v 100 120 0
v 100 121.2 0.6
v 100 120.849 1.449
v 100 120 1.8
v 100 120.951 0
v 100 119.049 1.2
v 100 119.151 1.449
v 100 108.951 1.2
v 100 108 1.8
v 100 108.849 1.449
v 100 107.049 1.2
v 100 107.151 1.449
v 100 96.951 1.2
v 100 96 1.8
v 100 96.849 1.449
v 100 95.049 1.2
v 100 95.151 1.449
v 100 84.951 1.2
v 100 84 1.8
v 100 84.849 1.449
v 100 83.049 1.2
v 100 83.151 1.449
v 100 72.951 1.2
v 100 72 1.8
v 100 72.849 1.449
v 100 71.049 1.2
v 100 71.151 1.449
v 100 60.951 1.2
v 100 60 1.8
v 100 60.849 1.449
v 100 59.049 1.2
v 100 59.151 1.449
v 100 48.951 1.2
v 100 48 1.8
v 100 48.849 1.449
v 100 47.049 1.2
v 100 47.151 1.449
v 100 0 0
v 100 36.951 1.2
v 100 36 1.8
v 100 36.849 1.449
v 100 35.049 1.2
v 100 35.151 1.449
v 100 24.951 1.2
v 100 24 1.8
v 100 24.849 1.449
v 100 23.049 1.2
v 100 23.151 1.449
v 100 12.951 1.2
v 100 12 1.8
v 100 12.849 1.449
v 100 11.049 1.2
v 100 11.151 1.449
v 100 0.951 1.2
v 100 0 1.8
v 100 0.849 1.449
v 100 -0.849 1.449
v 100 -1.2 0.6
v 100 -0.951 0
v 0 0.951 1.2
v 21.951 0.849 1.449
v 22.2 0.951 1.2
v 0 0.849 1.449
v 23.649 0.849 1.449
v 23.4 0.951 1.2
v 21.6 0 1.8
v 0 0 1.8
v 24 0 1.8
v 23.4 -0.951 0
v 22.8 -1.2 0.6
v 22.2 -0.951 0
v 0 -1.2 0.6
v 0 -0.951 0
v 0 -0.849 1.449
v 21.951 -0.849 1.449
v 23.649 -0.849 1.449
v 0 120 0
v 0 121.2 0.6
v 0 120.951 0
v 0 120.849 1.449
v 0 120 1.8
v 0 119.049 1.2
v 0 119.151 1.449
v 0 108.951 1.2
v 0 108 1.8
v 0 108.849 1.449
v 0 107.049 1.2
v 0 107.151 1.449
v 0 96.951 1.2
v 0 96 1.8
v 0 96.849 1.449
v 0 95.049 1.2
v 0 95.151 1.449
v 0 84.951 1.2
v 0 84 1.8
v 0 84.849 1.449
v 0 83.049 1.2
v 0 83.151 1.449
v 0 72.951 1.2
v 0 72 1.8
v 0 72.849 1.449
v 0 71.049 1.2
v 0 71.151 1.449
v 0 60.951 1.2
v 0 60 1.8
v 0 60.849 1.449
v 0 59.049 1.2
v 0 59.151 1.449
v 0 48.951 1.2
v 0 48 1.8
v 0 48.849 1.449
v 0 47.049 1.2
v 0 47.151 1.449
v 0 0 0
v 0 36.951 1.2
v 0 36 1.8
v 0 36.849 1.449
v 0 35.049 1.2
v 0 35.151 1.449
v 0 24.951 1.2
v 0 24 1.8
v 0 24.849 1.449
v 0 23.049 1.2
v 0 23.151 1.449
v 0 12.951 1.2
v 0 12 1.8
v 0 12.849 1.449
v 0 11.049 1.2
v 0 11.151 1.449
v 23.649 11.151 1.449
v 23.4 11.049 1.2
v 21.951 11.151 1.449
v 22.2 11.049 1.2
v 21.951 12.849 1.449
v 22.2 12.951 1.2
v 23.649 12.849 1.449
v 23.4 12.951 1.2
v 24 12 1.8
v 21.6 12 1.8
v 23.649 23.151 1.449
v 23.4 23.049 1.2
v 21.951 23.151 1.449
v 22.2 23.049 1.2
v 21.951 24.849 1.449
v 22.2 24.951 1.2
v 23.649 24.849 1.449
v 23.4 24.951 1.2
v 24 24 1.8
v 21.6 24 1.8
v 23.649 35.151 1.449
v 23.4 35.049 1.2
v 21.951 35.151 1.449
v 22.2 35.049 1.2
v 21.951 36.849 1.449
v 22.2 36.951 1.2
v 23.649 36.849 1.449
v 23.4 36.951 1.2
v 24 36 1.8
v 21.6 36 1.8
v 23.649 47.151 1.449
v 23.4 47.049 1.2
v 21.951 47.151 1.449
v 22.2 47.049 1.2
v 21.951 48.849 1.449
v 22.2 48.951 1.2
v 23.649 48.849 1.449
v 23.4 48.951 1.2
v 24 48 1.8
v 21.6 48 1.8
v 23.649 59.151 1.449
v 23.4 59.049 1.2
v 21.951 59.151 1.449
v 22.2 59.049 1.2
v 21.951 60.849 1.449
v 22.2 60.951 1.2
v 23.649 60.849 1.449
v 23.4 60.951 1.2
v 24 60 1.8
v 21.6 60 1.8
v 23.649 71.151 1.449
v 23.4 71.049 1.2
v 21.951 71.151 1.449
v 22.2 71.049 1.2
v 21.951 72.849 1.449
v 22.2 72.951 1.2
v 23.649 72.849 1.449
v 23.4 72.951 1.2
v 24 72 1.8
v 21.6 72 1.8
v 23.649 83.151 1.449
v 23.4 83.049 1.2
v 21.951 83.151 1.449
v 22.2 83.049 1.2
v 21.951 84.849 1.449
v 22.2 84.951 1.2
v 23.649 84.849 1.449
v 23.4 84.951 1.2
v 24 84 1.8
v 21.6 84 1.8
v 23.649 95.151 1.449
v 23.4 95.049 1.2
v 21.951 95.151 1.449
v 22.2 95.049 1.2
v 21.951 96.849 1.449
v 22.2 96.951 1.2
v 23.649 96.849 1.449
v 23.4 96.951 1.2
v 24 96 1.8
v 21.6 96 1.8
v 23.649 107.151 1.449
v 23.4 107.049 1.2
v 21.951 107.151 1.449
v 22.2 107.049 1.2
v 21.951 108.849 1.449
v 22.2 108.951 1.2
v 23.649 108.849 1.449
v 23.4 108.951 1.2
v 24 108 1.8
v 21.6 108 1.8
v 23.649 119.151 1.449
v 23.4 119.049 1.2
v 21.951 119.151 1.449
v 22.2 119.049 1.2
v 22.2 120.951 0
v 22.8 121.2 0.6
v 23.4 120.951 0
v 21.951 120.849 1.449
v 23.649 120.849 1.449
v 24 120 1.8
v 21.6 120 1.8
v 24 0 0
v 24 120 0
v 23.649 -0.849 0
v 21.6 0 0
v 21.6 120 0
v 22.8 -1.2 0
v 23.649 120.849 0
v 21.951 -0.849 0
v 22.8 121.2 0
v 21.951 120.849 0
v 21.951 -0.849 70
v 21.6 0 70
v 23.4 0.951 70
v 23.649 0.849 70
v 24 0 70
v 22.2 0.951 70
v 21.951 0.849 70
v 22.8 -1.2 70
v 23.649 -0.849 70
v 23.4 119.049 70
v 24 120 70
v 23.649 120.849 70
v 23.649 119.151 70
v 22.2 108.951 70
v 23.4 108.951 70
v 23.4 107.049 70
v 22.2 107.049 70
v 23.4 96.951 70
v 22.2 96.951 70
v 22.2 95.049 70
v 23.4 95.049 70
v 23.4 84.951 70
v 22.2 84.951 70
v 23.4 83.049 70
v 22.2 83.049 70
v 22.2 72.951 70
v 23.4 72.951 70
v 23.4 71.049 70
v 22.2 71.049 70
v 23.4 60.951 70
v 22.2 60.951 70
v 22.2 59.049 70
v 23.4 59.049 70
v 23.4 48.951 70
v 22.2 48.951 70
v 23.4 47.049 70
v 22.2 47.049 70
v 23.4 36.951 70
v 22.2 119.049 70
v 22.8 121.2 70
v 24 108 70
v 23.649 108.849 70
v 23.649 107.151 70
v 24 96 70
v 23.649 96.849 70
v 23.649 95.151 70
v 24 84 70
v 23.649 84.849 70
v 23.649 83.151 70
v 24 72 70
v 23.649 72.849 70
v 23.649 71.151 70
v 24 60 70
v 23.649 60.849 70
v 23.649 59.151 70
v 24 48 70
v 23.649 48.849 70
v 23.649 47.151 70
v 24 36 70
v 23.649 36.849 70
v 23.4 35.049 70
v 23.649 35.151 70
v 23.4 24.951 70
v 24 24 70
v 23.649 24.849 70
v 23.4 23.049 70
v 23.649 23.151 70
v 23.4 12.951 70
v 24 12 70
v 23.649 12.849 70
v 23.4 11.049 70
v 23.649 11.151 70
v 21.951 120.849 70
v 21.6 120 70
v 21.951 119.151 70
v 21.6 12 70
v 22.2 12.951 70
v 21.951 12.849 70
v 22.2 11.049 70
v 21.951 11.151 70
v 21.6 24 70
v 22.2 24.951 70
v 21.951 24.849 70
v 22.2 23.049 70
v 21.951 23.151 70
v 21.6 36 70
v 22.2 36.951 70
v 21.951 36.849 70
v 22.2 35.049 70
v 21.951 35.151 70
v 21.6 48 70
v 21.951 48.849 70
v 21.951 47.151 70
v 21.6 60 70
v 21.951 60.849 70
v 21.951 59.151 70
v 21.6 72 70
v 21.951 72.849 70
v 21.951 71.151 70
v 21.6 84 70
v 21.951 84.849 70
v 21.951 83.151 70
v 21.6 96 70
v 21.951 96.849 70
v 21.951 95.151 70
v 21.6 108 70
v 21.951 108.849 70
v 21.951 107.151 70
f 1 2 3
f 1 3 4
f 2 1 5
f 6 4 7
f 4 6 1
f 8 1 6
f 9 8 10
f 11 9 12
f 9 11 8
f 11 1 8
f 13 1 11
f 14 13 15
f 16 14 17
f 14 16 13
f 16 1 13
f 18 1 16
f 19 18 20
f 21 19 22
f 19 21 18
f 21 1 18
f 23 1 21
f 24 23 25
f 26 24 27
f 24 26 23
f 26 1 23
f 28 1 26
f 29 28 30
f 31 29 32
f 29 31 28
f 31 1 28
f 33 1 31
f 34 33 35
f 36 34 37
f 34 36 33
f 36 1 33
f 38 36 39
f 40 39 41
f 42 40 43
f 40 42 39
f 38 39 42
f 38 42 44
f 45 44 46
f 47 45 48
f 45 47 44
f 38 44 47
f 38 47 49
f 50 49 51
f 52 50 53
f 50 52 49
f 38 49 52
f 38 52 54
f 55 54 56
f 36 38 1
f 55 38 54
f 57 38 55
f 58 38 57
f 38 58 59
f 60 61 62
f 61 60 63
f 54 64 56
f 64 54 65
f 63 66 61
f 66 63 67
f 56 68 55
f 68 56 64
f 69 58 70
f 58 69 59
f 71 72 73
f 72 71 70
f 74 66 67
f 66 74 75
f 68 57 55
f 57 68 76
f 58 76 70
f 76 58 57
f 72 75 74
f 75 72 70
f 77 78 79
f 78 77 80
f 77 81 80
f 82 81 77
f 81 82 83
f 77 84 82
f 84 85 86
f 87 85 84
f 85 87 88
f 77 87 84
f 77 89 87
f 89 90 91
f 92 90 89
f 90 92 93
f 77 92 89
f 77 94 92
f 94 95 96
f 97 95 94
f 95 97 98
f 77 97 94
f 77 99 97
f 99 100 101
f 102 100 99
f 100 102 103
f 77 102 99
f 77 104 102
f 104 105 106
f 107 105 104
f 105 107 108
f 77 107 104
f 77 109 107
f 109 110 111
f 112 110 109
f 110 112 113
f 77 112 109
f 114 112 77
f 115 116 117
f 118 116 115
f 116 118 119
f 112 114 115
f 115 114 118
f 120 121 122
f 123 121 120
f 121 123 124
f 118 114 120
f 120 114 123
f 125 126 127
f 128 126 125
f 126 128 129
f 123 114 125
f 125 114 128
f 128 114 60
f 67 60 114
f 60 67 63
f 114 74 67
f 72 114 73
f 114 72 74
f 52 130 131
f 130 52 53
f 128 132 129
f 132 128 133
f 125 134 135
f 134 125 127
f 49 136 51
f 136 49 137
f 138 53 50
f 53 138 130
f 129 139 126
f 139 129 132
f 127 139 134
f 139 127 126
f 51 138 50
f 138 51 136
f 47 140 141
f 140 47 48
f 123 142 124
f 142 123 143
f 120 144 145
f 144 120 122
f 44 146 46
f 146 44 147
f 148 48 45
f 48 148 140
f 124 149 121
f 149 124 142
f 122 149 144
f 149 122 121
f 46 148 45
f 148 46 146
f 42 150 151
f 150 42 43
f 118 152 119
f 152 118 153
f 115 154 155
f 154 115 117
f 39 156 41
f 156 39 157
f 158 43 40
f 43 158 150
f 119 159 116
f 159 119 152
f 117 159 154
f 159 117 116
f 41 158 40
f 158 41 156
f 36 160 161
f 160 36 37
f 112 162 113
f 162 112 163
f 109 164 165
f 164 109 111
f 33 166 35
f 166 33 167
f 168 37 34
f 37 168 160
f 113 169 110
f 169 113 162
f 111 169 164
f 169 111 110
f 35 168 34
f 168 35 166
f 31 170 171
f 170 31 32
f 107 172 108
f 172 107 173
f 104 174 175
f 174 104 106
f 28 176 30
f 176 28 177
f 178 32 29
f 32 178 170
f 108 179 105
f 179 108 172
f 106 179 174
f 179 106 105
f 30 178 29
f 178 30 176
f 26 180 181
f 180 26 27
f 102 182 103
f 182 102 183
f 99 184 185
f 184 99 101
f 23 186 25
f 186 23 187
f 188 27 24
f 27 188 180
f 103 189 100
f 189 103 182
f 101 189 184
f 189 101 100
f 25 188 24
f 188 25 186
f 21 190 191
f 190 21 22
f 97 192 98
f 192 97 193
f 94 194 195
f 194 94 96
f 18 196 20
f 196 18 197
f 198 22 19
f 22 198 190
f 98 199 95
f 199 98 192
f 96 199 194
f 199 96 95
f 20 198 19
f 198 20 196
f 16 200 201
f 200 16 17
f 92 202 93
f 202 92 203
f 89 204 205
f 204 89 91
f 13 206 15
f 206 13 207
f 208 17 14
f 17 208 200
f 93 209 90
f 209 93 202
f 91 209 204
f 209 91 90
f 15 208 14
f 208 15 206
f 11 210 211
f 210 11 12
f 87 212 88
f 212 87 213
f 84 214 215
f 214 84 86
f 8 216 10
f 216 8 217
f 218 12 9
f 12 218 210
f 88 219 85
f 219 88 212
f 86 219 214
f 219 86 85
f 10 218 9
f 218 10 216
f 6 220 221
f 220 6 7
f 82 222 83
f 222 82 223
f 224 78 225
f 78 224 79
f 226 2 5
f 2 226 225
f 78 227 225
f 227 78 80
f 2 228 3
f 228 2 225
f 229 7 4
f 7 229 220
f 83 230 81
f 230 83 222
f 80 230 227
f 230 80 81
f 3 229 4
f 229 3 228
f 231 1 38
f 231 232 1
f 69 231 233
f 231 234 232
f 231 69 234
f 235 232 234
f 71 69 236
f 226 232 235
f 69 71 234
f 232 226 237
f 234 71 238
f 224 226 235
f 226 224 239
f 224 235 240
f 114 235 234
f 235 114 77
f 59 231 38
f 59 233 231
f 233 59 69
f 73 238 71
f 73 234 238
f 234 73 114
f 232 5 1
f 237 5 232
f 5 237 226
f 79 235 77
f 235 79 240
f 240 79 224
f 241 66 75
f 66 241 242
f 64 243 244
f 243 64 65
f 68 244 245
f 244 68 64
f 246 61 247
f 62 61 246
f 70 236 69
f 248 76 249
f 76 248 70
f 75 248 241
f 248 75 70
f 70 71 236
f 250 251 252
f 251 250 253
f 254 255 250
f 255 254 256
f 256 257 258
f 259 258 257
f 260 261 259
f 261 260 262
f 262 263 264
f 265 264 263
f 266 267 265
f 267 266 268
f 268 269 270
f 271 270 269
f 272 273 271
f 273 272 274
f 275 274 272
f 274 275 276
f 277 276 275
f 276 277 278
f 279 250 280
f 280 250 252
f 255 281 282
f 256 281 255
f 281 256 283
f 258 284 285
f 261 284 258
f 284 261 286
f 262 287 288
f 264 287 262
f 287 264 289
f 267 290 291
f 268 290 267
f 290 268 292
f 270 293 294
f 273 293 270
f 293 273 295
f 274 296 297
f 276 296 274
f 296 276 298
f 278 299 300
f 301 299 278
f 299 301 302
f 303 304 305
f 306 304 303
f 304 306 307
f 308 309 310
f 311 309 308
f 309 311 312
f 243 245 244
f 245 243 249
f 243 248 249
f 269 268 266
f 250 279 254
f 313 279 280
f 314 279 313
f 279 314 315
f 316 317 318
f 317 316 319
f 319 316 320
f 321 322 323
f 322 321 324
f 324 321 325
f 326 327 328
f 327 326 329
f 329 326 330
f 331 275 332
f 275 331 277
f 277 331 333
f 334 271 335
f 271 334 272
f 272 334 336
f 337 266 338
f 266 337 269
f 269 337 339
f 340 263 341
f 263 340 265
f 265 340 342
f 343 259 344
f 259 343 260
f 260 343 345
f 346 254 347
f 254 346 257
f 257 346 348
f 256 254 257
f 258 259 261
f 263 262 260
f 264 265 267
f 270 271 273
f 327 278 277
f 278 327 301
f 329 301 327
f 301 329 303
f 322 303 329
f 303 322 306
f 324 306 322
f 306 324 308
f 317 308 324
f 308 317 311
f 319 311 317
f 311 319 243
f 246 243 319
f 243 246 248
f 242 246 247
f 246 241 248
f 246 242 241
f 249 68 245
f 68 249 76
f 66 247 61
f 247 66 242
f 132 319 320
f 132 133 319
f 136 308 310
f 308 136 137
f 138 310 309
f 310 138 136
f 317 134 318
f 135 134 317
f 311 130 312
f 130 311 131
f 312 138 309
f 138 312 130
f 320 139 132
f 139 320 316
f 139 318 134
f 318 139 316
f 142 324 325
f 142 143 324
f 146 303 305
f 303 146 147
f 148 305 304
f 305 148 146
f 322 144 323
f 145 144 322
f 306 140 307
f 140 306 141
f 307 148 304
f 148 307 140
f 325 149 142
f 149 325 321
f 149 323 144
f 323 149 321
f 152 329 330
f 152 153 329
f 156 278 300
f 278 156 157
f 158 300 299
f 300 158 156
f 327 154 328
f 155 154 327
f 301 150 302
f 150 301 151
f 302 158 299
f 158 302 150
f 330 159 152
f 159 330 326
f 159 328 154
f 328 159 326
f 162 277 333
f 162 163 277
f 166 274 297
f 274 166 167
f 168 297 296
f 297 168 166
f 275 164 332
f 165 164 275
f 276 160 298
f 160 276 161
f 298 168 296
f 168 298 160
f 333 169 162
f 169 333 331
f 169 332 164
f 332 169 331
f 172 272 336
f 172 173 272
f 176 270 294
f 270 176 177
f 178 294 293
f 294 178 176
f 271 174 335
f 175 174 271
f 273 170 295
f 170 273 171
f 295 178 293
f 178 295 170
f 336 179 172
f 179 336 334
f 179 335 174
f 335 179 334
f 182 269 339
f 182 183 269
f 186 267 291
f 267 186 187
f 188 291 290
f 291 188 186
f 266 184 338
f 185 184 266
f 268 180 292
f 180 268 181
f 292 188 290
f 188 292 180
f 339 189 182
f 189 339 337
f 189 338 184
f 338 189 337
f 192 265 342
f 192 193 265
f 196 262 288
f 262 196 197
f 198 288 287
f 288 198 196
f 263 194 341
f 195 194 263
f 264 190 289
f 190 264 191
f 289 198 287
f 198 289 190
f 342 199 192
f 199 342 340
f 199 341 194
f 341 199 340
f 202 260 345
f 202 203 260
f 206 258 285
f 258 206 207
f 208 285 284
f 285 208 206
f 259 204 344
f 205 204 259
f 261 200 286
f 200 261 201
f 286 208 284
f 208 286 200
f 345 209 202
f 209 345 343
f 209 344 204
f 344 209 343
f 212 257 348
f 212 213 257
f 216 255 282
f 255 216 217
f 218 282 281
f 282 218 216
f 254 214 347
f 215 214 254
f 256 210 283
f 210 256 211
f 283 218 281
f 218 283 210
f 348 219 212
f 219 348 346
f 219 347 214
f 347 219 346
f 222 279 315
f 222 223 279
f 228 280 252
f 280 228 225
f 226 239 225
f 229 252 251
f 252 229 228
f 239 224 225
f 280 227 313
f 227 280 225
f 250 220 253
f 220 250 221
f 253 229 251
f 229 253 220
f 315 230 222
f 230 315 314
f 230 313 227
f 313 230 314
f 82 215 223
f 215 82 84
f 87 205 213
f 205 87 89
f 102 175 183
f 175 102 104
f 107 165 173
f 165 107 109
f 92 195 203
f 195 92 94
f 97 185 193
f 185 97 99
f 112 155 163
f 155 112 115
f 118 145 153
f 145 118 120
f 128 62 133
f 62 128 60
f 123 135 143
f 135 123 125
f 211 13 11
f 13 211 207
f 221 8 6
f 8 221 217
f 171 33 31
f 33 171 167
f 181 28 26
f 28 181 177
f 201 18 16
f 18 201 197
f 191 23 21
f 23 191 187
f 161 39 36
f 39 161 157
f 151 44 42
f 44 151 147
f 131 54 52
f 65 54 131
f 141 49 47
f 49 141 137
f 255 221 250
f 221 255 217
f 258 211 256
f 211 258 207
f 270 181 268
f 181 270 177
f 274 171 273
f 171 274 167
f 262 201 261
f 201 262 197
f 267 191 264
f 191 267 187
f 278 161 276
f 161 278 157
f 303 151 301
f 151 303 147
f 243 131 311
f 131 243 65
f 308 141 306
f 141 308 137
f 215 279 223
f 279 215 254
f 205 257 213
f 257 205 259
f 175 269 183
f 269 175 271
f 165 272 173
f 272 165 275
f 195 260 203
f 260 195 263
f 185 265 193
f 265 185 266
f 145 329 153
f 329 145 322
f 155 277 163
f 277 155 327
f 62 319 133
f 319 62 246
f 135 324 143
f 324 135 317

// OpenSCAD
$fn=8;
thickness = 1.2;
length = 100;
ribs = 10; // 8; // 10;
width = 120; // 80; // 120;
height = 70;
holeDiam = 6;
holeDistance = holeDiam * 1.2;
wallOffset = (3 * holeDistance) + (thickness / 2);
holes = false;


// Base
difference() {
    cube([length, width, thickness]);
    if(holes) {
        for(w = [0 : width / ribs : width]) {
            for(l = [holeDiam : holeDistance : length - holeDiam]) {
                translate([l, w + width / ribs / 2, 0]) cylinder(thickness, d = holeDiam);
            }
        }
    }
}
 
difference() {
    for(variable = [0 : width / ribs : width]) {
        translate([0, variable, thickness / 2]) rotate([0, 90, 0]) cylinder(length, r = thickness);
    }
    translate([0, -thickness, -thickness]) cube([length, width + 2 * thickness, thickness]);
}

    
// Wall
difference() {
    translate([wallOffset, 0, 0]) cube([thickness, width, height]);
    if(holes) {
        for(w = [0 : width / ribs : width]) {
            for(h = [holeDiam : holeDistance : height - holeDiam]) {
                translate([wallOffset, w + width / ribs / 2, h]) rotate([0, 90, 0]) cylinder(thickness, d = holeDiam);
            }
        }
    }
}

for(variable = [0 : width / ribs : width]) {
    translate([wallOffset + thickness / 2, variable, 0]) cylinder(height, r = thickness);
}
